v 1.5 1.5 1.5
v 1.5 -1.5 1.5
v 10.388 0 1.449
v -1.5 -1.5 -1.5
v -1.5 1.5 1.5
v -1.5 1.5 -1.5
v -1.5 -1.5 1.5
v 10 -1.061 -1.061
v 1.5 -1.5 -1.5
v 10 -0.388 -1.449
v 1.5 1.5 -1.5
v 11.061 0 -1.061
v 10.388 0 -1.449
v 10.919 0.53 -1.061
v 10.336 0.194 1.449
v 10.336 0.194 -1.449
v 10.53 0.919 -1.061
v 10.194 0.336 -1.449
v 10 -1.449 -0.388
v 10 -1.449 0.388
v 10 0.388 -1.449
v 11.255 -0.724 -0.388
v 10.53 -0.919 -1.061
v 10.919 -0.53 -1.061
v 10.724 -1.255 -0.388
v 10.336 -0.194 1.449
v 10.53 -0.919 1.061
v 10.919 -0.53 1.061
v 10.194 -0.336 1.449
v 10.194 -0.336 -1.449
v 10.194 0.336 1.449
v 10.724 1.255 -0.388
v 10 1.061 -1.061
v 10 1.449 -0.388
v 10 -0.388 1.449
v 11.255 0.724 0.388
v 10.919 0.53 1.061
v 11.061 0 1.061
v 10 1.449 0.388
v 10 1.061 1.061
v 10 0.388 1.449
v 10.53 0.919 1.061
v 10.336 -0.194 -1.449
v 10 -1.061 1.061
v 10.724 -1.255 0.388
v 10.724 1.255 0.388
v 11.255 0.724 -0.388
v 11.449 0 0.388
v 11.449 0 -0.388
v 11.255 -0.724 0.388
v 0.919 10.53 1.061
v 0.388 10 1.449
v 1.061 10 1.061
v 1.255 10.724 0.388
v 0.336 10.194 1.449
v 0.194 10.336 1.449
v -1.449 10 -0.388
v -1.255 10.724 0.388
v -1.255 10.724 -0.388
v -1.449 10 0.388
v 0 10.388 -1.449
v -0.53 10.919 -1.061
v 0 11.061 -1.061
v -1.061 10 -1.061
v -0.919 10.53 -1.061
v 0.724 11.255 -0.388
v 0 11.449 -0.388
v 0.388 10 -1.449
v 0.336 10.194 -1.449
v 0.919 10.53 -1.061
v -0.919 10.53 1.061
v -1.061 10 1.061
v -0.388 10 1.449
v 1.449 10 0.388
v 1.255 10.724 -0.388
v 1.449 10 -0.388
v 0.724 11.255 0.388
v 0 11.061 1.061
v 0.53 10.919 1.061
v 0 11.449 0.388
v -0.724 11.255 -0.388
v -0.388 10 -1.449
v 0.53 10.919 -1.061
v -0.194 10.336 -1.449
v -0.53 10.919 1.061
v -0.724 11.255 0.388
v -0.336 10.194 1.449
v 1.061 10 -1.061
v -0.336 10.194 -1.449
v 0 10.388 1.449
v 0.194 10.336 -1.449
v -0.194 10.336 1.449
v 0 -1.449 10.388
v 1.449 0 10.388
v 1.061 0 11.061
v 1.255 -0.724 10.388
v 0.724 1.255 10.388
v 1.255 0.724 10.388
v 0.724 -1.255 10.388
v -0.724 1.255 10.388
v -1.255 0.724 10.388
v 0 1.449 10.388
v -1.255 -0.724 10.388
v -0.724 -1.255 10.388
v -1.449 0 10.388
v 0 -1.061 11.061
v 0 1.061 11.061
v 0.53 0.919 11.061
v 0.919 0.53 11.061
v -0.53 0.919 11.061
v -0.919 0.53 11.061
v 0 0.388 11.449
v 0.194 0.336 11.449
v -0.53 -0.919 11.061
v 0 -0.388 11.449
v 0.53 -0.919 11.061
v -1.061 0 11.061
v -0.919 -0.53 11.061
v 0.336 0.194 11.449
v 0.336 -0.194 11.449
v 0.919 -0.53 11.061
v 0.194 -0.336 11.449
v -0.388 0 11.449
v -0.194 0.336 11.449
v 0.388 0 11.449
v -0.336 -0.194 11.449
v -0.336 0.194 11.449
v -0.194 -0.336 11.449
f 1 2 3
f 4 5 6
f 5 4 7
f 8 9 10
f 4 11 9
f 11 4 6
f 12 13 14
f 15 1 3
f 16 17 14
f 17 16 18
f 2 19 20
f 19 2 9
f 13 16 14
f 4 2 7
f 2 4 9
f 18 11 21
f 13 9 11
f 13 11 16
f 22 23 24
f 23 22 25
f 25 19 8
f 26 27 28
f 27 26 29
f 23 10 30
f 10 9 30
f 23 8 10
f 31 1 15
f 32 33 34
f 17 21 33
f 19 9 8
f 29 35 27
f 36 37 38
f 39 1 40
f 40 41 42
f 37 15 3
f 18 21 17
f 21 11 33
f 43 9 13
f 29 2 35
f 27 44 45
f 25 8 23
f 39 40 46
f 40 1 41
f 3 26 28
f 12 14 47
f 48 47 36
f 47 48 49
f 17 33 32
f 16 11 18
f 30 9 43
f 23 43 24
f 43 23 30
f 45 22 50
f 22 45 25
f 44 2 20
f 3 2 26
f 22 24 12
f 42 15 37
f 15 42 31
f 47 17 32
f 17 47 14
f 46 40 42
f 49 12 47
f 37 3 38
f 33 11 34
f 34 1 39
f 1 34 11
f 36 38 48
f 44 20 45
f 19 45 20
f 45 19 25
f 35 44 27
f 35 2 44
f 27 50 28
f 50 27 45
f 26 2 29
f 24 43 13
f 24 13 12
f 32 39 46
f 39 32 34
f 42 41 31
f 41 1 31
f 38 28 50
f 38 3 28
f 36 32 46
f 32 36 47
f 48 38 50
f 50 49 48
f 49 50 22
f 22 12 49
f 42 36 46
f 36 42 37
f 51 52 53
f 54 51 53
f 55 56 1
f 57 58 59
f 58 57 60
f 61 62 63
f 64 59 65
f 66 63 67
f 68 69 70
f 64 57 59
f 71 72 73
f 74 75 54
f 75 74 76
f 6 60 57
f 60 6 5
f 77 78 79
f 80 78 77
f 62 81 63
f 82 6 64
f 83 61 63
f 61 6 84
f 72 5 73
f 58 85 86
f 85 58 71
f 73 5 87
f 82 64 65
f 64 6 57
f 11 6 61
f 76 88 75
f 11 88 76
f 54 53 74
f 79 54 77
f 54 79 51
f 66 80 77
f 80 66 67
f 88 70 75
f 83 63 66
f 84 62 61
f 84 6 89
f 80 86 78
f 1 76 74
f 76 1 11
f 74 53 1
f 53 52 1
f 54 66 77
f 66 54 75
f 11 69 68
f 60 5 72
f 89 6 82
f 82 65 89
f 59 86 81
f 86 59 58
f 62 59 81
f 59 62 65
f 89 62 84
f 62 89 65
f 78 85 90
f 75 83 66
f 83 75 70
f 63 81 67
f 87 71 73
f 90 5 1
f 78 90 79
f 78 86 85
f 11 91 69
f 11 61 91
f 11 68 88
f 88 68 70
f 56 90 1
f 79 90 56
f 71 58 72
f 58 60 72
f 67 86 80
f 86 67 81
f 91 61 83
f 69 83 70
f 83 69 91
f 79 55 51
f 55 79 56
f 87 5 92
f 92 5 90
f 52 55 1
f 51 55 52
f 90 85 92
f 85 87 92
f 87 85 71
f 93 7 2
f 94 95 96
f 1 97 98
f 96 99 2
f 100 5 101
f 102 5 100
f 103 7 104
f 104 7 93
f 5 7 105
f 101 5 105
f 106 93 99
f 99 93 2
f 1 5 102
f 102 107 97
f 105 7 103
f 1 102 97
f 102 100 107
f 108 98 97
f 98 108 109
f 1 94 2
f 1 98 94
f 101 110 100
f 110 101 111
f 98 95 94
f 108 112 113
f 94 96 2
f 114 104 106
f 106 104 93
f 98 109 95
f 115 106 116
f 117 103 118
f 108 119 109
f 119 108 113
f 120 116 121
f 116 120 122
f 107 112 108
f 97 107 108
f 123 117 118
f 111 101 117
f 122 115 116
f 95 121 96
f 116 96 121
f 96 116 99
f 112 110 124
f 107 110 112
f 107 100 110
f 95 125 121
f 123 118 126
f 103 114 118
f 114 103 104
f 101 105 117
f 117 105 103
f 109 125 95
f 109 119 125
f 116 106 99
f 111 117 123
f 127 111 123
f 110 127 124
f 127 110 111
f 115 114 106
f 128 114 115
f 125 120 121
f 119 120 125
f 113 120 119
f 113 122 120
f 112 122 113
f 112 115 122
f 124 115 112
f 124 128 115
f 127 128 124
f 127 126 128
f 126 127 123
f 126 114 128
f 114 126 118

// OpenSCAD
// Generated by scadwright. Do not hand-edit —
// edit the Python source and regenerate.

$fn = 12;

union() {
    hull() {
        cube([3, 3, 3], center=true);
        translate([10, 0, 0]) {
            sphere(r=1.5);
        }
    }

    hull() {
        cube([3, 3, 3], center=true);
        translate([0, 10, 0]) {
            sphere(r=1.5);
        }
    }

    hull() {
        cube([3, 3, 3], center=true);
        translate([0, 0, 10]) {
            sphere(r=1.5);
        }
    }
}
